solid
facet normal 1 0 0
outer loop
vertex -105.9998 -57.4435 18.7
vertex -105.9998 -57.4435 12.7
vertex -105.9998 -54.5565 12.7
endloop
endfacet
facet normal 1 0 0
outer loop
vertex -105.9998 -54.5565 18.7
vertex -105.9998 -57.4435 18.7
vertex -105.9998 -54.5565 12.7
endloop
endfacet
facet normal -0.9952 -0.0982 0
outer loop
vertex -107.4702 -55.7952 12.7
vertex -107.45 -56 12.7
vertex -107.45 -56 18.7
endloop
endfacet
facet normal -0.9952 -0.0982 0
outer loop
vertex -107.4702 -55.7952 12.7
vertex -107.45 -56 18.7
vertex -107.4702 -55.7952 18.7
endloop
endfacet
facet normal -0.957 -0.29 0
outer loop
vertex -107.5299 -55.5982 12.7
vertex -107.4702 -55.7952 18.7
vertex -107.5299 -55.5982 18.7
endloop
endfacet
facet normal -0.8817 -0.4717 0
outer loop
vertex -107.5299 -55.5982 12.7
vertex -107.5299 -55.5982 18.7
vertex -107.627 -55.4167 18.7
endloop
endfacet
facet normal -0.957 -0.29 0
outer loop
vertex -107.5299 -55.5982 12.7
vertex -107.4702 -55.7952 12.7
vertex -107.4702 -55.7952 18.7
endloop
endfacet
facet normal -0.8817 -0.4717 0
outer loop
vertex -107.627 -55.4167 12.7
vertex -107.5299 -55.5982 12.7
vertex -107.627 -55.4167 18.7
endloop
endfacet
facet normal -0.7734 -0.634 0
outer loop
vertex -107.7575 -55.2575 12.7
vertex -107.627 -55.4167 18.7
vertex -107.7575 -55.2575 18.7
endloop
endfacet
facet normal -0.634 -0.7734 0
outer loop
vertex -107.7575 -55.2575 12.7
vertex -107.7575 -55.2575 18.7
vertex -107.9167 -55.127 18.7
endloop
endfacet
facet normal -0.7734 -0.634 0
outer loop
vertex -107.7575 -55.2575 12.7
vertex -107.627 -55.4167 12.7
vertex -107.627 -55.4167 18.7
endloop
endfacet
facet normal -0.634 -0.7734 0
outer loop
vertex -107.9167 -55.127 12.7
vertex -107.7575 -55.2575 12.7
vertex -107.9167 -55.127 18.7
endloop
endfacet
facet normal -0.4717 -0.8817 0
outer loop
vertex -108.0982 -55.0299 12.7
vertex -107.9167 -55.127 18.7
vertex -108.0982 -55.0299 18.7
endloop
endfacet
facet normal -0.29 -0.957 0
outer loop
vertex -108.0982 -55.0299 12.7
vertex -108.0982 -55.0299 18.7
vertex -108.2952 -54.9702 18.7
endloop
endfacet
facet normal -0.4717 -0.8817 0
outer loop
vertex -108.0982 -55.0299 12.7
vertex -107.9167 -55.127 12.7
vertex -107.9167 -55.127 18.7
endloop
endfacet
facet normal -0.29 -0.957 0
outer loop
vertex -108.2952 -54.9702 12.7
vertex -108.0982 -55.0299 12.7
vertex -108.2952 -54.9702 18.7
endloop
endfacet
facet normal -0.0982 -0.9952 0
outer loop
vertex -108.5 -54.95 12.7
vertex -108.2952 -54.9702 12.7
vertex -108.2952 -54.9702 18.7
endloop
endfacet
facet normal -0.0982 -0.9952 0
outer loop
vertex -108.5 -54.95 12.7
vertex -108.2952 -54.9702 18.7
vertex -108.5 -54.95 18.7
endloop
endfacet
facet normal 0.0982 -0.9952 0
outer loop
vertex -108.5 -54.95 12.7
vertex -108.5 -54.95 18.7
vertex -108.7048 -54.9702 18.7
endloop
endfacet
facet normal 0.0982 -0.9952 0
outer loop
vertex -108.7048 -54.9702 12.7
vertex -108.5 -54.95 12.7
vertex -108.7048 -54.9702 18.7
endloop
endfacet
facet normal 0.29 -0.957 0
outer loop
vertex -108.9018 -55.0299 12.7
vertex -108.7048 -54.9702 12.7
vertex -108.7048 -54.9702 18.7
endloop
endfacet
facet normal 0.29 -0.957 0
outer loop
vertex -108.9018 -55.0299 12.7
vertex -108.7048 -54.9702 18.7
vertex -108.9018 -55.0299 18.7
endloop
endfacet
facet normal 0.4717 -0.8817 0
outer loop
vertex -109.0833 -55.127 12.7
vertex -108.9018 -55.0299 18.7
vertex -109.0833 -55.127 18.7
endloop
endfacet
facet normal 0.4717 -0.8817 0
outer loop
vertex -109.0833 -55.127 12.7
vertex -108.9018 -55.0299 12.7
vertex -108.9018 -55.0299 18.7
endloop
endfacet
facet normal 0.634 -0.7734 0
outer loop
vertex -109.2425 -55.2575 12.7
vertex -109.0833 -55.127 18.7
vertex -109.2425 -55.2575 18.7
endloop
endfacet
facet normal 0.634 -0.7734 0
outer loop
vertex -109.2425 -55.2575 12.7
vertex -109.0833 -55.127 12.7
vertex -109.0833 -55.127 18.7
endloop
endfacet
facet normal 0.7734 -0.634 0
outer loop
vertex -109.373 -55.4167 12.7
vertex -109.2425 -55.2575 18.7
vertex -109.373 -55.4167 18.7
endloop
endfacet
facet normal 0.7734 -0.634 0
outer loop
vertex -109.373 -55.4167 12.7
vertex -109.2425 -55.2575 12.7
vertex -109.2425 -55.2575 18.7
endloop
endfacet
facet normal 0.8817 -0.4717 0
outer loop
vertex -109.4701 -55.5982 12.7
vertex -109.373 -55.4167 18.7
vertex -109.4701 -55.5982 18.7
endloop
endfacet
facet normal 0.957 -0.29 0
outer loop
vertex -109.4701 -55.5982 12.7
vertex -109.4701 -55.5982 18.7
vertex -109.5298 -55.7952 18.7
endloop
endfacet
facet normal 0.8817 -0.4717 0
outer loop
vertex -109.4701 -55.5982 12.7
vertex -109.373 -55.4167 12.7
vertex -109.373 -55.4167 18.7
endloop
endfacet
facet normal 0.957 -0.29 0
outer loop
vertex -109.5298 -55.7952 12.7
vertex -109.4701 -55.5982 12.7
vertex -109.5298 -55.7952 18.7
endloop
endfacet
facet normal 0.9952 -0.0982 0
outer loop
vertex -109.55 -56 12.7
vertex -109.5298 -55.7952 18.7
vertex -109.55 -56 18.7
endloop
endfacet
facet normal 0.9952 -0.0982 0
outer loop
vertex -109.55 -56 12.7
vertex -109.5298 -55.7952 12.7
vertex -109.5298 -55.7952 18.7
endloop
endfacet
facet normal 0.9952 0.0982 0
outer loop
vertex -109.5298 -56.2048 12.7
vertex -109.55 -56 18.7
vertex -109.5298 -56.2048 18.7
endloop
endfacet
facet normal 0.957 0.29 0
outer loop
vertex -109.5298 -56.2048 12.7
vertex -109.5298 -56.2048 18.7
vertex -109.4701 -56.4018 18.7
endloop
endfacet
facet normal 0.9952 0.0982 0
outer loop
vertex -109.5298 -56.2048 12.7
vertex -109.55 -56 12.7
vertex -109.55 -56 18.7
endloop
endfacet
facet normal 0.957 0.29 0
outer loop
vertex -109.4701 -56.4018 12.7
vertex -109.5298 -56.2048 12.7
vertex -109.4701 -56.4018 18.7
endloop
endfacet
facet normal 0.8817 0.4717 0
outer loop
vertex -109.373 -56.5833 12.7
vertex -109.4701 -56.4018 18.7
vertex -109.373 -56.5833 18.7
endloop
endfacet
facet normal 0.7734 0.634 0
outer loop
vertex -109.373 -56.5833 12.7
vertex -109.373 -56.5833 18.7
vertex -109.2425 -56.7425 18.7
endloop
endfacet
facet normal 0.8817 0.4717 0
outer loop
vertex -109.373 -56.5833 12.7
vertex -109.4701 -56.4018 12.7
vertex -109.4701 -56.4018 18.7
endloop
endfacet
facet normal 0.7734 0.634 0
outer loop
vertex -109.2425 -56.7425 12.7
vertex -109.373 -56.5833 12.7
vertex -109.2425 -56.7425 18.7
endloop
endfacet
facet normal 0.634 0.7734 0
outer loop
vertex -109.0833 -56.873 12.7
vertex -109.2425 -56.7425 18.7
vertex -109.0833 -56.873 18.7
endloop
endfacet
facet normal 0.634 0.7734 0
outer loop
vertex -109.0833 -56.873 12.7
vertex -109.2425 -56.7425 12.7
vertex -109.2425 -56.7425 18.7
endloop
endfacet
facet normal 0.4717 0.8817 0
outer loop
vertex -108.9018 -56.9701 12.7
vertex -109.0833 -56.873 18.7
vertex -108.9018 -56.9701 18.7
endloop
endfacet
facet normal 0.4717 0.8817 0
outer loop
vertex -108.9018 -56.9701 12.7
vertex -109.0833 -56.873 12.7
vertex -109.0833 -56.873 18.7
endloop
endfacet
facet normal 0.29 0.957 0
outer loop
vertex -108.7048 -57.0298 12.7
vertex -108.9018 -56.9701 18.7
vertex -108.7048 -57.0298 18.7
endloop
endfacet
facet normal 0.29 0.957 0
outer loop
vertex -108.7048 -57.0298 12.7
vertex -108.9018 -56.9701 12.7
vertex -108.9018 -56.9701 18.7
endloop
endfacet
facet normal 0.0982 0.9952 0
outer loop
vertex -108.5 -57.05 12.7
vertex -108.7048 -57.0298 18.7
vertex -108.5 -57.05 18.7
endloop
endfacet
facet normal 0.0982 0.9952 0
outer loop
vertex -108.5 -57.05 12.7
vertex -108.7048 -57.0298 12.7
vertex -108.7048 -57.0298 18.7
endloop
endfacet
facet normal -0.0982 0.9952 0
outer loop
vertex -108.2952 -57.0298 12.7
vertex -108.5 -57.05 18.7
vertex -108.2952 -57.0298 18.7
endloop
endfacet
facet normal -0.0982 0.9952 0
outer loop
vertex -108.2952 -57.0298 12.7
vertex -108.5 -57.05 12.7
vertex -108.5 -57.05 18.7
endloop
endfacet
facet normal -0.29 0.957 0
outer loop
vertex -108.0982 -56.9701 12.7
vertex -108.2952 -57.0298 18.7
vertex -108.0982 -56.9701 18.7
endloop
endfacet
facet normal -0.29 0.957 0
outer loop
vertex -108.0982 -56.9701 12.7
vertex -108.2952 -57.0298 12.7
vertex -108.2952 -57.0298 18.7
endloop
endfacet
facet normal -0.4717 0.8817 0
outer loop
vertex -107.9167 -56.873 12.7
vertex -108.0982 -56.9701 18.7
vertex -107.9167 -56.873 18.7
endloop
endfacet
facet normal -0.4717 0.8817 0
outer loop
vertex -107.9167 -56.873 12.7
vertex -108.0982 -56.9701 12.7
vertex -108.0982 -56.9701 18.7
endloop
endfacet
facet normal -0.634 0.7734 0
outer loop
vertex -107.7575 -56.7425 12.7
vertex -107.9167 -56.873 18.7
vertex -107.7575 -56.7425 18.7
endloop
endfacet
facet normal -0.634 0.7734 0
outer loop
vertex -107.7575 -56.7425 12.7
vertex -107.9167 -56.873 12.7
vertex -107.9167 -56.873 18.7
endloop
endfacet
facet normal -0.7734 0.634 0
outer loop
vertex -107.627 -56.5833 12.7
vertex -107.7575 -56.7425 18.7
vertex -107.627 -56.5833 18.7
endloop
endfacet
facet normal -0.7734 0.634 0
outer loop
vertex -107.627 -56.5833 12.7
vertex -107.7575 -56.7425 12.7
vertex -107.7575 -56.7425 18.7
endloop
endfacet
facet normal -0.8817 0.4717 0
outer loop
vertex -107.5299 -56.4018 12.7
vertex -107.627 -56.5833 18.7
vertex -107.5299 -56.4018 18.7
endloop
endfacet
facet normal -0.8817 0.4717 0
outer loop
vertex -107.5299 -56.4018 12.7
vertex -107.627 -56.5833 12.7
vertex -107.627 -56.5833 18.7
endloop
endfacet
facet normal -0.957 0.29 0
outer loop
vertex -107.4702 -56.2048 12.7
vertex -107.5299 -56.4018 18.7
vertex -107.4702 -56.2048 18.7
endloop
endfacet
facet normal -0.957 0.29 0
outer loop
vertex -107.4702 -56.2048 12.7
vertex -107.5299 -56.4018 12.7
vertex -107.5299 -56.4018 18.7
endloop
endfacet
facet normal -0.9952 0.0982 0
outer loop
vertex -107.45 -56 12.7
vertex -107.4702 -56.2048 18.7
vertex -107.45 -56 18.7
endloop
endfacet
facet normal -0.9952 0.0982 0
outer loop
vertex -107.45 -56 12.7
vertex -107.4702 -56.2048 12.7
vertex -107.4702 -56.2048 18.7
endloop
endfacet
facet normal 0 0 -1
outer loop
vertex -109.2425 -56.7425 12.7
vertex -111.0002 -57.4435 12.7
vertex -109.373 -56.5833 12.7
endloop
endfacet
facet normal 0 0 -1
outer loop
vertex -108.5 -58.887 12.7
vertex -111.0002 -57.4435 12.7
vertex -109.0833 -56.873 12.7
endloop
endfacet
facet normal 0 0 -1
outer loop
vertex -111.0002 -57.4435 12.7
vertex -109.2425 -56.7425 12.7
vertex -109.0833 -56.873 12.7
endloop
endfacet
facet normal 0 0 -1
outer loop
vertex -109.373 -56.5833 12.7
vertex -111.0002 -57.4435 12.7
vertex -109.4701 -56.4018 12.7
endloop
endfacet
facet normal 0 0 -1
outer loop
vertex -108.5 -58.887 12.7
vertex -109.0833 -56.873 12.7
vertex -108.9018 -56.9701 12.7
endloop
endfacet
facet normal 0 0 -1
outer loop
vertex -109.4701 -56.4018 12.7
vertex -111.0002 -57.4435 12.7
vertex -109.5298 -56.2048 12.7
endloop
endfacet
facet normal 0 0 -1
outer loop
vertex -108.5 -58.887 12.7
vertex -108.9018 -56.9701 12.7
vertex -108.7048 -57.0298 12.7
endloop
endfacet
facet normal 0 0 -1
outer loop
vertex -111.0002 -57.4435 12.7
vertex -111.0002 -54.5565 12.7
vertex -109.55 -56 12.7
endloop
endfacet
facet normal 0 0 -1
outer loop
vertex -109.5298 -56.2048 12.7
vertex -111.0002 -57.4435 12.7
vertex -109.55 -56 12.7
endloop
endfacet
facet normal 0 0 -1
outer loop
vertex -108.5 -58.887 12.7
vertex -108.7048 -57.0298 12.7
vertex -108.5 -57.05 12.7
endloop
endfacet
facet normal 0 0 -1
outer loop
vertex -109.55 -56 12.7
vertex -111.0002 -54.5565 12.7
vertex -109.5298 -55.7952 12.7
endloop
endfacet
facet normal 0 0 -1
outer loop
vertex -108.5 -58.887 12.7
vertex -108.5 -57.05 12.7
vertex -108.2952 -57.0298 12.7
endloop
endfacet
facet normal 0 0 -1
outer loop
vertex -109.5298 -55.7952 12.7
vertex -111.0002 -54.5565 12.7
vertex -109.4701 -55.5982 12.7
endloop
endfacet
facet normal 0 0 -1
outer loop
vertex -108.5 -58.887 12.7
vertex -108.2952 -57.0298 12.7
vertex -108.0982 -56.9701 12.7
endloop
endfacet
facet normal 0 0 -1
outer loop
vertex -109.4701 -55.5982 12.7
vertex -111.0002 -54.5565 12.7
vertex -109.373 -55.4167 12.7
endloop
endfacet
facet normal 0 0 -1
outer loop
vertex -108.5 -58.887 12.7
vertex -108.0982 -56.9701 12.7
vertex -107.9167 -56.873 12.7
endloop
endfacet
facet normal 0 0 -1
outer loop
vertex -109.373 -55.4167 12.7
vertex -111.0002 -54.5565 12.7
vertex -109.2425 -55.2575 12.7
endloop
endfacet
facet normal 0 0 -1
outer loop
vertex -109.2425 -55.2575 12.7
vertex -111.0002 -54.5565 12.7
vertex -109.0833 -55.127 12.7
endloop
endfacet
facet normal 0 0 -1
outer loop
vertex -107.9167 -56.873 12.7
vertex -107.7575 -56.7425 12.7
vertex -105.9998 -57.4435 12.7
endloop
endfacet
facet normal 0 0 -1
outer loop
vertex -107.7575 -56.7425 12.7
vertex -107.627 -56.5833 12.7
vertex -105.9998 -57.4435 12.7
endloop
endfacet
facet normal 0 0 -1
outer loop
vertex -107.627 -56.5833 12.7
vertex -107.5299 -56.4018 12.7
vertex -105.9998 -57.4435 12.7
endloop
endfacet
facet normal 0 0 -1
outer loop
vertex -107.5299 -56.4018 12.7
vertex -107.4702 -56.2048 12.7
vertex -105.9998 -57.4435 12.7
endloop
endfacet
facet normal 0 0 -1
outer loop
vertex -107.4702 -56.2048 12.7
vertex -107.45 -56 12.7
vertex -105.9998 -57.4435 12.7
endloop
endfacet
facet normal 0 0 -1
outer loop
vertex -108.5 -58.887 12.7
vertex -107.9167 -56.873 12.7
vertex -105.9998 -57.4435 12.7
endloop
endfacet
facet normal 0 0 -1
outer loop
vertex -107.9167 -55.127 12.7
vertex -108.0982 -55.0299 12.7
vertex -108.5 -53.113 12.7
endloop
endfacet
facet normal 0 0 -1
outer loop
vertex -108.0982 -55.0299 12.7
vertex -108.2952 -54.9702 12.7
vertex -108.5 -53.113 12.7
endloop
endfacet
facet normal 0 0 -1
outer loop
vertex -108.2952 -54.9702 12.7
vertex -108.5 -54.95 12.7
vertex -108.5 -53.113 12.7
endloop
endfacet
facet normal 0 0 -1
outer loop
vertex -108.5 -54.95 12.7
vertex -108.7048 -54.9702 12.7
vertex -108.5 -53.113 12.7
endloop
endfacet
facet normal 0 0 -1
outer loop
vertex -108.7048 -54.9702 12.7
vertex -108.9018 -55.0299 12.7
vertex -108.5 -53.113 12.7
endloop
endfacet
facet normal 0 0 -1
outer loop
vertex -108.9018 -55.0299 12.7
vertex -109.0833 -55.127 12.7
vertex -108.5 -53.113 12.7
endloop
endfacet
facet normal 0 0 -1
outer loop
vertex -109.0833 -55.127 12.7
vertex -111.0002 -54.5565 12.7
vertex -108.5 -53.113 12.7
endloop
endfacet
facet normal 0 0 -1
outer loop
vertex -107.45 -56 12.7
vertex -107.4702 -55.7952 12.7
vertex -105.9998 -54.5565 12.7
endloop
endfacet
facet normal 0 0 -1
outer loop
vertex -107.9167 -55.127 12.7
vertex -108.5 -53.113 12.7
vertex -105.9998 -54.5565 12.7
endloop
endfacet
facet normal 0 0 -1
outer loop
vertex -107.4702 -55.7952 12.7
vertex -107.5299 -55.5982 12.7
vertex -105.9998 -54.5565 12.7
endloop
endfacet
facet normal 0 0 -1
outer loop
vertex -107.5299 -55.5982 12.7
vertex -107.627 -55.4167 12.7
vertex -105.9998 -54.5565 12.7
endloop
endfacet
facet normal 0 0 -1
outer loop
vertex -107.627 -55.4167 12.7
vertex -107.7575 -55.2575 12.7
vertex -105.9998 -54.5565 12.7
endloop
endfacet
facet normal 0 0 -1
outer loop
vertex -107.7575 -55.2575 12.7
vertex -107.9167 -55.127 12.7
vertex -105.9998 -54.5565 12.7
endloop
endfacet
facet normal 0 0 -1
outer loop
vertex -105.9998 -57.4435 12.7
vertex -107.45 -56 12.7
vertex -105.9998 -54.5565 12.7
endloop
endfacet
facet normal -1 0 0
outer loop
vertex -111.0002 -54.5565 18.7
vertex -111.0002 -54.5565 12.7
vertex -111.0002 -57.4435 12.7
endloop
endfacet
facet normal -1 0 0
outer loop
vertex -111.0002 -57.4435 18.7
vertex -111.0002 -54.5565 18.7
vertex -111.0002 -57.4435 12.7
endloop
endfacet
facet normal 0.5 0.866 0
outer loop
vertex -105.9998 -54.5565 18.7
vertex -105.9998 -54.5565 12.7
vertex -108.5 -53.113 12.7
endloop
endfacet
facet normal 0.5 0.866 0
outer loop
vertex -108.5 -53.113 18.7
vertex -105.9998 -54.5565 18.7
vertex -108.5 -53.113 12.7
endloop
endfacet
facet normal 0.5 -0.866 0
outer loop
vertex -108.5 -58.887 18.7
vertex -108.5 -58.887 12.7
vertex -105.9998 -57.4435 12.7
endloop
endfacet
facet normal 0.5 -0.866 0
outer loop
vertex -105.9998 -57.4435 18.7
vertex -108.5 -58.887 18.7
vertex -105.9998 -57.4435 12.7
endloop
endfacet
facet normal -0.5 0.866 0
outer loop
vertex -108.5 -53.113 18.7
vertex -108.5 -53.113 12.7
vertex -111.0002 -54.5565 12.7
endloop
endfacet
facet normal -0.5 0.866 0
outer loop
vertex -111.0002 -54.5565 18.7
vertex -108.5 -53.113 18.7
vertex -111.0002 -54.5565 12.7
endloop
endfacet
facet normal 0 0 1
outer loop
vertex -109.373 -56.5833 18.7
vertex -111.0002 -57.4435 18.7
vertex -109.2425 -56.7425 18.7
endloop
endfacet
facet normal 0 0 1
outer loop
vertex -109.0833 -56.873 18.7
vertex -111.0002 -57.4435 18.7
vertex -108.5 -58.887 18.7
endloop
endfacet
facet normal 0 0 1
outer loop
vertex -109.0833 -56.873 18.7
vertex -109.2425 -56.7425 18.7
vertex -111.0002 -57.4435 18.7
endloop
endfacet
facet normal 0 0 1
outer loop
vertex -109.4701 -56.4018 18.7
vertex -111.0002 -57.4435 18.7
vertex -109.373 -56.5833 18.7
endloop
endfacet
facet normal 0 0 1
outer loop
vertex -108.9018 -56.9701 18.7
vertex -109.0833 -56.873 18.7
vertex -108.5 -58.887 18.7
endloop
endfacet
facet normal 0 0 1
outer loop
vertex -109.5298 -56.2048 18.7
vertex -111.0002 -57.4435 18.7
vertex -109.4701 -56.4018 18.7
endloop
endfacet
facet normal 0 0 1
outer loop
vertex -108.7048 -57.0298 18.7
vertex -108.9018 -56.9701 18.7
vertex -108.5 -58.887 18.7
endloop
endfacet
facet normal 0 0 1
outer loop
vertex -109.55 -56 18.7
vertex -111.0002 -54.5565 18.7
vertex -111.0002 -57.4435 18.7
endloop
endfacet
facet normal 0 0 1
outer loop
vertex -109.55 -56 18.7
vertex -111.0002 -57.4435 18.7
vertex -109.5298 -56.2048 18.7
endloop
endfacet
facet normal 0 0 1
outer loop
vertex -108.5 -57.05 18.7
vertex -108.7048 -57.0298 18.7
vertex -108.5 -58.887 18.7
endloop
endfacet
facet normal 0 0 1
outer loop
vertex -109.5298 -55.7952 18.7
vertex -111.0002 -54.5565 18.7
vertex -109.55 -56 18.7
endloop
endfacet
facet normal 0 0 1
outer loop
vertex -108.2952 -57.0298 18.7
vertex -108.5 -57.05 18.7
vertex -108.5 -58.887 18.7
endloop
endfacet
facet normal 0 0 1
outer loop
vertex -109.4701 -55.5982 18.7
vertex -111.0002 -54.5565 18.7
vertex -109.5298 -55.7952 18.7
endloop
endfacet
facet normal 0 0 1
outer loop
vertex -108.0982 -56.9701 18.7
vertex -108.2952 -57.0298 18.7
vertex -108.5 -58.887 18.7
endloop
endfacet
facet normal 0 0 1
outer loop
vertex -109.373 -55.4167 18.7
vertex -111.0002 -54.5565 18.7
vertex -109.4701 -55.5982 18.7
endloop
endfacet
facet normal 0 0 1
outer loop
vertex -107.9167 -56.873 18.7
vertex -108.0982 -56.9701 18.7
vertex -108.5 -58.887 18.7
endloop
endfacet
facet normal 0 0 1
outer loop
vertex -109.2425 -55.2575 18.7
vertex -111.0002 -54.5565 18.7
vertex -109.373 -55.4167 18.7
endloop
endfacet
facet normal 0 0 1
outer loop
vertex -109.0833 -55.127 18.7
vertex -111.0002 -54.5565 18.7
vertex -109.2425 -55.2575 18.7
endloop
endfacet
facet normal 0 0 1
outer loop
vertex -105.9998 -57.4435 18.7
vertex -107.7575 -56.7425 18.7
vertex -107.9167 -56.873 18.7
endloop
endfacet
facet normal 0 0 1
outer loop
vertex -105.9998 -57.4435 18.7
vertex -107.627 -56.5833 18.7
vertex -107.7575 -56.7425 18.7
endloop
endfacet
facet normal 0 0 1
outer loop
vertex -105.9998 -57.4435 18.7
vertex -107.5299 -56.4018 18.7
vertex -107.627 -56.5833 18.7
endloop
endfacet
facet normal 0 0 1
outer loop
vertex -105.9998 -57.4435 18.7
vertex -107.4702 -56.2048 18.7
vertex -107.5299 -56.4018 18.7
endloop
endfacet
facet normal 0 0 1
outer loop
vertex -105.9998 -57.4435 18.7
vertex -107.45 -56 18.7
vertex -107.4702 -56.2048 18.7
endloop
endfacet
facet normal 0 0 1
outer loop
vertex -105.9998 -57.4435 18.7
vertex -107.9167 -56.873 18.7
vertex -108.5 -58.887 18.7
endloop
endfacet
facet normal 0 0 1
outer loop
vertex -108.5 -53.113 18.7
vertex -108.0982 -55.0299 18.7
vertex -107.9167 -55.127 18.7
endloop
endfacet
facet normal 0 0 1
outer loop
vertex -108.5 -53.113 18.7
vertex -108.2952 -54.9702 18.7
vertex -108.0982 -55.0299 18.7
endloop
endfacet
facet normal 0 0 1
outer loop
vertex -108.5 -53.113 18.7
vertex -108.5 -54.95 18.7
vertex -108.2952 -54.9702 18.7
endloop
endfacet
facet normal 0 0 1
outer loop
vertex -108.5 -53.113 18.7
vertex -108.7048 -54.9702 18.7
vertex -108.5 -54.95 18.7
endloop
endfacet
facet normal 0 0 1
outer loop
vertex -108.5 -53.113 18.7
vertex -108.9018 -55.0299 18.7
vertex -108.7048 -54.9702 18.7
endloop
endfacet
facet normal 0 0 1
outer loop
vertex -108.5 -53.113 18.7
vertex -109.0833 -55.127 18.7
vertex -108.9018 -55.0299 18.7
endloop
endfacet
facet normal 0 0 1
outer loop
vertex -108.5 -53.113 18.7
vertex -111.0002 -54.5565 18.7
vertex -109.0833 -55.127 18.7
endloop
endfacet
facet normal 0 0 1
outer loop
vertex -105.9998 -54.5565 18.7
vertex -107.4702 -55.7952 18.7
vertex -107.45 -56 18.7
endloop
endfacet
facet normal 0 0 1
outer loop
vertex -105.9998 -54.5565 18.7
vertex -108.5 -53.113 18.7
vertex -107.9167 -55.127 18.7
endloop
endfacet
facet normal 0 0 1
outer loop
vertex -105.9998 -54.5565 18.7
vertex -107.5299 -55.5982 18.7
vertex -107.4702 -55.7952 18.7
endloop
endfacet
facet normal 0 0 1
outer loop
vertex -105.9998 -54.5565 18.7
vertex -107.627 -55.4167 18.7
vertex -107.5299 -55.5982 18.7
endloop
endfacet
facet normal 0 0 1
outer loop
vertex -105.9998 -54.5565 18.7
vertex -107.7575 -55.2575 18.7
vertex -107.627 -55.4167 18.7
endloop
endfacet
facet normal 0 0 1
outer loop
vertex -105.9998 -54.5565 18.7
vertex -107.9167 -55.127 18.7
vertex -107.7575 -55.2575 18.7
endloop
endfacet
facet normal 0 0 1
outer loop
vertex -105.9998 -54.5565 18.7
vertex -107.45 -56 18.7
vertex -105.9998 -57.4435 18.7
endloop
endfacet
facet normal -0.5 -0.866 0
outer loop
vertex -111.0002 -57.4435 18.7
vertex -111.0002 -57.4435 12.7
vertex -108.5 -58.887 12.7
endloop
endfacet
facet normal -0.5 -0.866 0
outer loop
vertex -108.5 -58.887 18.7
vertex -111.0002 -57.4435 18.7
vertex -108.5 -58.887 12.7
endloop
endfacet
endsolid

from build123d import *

# Parameters (mm, degrees)
HEX_5_START      = 12.7
HEX_5_DEPTH      = 6
ROSCA_M2_5_START = 12.7
CROQUIS2_R       = 1.05
ROSCA_M2_5_DEPTH = 6


with BuildPart() as part:
    # Croquis1 → Hex_5 (new body)
    with BuildSketch(Plane.XY.offset(HEX_5_START)):
        Polygon((-105.999784659, -54.5565), (-108.5, -53.113), (-111.000215341, -54.5565), (-111.000215341, -57.4435), (-108.5, -58.887), (-105.999784659, -57.4435), align=None)
    extrude(amount=HEX_5_DEPTH)

    # Croquis2 → Rosca_M2-5 (cut)
    with BuildSketch(Plane.XY.offset(ROSCA_M2_5_START)):
        with Locations((-108.5, -56)):
            Circle(CROQUIS2_R)
    extrude(amount=ROSCA_M2_5_DEPTH, mode=Mode.SUBTRACT)


solid = part.part
